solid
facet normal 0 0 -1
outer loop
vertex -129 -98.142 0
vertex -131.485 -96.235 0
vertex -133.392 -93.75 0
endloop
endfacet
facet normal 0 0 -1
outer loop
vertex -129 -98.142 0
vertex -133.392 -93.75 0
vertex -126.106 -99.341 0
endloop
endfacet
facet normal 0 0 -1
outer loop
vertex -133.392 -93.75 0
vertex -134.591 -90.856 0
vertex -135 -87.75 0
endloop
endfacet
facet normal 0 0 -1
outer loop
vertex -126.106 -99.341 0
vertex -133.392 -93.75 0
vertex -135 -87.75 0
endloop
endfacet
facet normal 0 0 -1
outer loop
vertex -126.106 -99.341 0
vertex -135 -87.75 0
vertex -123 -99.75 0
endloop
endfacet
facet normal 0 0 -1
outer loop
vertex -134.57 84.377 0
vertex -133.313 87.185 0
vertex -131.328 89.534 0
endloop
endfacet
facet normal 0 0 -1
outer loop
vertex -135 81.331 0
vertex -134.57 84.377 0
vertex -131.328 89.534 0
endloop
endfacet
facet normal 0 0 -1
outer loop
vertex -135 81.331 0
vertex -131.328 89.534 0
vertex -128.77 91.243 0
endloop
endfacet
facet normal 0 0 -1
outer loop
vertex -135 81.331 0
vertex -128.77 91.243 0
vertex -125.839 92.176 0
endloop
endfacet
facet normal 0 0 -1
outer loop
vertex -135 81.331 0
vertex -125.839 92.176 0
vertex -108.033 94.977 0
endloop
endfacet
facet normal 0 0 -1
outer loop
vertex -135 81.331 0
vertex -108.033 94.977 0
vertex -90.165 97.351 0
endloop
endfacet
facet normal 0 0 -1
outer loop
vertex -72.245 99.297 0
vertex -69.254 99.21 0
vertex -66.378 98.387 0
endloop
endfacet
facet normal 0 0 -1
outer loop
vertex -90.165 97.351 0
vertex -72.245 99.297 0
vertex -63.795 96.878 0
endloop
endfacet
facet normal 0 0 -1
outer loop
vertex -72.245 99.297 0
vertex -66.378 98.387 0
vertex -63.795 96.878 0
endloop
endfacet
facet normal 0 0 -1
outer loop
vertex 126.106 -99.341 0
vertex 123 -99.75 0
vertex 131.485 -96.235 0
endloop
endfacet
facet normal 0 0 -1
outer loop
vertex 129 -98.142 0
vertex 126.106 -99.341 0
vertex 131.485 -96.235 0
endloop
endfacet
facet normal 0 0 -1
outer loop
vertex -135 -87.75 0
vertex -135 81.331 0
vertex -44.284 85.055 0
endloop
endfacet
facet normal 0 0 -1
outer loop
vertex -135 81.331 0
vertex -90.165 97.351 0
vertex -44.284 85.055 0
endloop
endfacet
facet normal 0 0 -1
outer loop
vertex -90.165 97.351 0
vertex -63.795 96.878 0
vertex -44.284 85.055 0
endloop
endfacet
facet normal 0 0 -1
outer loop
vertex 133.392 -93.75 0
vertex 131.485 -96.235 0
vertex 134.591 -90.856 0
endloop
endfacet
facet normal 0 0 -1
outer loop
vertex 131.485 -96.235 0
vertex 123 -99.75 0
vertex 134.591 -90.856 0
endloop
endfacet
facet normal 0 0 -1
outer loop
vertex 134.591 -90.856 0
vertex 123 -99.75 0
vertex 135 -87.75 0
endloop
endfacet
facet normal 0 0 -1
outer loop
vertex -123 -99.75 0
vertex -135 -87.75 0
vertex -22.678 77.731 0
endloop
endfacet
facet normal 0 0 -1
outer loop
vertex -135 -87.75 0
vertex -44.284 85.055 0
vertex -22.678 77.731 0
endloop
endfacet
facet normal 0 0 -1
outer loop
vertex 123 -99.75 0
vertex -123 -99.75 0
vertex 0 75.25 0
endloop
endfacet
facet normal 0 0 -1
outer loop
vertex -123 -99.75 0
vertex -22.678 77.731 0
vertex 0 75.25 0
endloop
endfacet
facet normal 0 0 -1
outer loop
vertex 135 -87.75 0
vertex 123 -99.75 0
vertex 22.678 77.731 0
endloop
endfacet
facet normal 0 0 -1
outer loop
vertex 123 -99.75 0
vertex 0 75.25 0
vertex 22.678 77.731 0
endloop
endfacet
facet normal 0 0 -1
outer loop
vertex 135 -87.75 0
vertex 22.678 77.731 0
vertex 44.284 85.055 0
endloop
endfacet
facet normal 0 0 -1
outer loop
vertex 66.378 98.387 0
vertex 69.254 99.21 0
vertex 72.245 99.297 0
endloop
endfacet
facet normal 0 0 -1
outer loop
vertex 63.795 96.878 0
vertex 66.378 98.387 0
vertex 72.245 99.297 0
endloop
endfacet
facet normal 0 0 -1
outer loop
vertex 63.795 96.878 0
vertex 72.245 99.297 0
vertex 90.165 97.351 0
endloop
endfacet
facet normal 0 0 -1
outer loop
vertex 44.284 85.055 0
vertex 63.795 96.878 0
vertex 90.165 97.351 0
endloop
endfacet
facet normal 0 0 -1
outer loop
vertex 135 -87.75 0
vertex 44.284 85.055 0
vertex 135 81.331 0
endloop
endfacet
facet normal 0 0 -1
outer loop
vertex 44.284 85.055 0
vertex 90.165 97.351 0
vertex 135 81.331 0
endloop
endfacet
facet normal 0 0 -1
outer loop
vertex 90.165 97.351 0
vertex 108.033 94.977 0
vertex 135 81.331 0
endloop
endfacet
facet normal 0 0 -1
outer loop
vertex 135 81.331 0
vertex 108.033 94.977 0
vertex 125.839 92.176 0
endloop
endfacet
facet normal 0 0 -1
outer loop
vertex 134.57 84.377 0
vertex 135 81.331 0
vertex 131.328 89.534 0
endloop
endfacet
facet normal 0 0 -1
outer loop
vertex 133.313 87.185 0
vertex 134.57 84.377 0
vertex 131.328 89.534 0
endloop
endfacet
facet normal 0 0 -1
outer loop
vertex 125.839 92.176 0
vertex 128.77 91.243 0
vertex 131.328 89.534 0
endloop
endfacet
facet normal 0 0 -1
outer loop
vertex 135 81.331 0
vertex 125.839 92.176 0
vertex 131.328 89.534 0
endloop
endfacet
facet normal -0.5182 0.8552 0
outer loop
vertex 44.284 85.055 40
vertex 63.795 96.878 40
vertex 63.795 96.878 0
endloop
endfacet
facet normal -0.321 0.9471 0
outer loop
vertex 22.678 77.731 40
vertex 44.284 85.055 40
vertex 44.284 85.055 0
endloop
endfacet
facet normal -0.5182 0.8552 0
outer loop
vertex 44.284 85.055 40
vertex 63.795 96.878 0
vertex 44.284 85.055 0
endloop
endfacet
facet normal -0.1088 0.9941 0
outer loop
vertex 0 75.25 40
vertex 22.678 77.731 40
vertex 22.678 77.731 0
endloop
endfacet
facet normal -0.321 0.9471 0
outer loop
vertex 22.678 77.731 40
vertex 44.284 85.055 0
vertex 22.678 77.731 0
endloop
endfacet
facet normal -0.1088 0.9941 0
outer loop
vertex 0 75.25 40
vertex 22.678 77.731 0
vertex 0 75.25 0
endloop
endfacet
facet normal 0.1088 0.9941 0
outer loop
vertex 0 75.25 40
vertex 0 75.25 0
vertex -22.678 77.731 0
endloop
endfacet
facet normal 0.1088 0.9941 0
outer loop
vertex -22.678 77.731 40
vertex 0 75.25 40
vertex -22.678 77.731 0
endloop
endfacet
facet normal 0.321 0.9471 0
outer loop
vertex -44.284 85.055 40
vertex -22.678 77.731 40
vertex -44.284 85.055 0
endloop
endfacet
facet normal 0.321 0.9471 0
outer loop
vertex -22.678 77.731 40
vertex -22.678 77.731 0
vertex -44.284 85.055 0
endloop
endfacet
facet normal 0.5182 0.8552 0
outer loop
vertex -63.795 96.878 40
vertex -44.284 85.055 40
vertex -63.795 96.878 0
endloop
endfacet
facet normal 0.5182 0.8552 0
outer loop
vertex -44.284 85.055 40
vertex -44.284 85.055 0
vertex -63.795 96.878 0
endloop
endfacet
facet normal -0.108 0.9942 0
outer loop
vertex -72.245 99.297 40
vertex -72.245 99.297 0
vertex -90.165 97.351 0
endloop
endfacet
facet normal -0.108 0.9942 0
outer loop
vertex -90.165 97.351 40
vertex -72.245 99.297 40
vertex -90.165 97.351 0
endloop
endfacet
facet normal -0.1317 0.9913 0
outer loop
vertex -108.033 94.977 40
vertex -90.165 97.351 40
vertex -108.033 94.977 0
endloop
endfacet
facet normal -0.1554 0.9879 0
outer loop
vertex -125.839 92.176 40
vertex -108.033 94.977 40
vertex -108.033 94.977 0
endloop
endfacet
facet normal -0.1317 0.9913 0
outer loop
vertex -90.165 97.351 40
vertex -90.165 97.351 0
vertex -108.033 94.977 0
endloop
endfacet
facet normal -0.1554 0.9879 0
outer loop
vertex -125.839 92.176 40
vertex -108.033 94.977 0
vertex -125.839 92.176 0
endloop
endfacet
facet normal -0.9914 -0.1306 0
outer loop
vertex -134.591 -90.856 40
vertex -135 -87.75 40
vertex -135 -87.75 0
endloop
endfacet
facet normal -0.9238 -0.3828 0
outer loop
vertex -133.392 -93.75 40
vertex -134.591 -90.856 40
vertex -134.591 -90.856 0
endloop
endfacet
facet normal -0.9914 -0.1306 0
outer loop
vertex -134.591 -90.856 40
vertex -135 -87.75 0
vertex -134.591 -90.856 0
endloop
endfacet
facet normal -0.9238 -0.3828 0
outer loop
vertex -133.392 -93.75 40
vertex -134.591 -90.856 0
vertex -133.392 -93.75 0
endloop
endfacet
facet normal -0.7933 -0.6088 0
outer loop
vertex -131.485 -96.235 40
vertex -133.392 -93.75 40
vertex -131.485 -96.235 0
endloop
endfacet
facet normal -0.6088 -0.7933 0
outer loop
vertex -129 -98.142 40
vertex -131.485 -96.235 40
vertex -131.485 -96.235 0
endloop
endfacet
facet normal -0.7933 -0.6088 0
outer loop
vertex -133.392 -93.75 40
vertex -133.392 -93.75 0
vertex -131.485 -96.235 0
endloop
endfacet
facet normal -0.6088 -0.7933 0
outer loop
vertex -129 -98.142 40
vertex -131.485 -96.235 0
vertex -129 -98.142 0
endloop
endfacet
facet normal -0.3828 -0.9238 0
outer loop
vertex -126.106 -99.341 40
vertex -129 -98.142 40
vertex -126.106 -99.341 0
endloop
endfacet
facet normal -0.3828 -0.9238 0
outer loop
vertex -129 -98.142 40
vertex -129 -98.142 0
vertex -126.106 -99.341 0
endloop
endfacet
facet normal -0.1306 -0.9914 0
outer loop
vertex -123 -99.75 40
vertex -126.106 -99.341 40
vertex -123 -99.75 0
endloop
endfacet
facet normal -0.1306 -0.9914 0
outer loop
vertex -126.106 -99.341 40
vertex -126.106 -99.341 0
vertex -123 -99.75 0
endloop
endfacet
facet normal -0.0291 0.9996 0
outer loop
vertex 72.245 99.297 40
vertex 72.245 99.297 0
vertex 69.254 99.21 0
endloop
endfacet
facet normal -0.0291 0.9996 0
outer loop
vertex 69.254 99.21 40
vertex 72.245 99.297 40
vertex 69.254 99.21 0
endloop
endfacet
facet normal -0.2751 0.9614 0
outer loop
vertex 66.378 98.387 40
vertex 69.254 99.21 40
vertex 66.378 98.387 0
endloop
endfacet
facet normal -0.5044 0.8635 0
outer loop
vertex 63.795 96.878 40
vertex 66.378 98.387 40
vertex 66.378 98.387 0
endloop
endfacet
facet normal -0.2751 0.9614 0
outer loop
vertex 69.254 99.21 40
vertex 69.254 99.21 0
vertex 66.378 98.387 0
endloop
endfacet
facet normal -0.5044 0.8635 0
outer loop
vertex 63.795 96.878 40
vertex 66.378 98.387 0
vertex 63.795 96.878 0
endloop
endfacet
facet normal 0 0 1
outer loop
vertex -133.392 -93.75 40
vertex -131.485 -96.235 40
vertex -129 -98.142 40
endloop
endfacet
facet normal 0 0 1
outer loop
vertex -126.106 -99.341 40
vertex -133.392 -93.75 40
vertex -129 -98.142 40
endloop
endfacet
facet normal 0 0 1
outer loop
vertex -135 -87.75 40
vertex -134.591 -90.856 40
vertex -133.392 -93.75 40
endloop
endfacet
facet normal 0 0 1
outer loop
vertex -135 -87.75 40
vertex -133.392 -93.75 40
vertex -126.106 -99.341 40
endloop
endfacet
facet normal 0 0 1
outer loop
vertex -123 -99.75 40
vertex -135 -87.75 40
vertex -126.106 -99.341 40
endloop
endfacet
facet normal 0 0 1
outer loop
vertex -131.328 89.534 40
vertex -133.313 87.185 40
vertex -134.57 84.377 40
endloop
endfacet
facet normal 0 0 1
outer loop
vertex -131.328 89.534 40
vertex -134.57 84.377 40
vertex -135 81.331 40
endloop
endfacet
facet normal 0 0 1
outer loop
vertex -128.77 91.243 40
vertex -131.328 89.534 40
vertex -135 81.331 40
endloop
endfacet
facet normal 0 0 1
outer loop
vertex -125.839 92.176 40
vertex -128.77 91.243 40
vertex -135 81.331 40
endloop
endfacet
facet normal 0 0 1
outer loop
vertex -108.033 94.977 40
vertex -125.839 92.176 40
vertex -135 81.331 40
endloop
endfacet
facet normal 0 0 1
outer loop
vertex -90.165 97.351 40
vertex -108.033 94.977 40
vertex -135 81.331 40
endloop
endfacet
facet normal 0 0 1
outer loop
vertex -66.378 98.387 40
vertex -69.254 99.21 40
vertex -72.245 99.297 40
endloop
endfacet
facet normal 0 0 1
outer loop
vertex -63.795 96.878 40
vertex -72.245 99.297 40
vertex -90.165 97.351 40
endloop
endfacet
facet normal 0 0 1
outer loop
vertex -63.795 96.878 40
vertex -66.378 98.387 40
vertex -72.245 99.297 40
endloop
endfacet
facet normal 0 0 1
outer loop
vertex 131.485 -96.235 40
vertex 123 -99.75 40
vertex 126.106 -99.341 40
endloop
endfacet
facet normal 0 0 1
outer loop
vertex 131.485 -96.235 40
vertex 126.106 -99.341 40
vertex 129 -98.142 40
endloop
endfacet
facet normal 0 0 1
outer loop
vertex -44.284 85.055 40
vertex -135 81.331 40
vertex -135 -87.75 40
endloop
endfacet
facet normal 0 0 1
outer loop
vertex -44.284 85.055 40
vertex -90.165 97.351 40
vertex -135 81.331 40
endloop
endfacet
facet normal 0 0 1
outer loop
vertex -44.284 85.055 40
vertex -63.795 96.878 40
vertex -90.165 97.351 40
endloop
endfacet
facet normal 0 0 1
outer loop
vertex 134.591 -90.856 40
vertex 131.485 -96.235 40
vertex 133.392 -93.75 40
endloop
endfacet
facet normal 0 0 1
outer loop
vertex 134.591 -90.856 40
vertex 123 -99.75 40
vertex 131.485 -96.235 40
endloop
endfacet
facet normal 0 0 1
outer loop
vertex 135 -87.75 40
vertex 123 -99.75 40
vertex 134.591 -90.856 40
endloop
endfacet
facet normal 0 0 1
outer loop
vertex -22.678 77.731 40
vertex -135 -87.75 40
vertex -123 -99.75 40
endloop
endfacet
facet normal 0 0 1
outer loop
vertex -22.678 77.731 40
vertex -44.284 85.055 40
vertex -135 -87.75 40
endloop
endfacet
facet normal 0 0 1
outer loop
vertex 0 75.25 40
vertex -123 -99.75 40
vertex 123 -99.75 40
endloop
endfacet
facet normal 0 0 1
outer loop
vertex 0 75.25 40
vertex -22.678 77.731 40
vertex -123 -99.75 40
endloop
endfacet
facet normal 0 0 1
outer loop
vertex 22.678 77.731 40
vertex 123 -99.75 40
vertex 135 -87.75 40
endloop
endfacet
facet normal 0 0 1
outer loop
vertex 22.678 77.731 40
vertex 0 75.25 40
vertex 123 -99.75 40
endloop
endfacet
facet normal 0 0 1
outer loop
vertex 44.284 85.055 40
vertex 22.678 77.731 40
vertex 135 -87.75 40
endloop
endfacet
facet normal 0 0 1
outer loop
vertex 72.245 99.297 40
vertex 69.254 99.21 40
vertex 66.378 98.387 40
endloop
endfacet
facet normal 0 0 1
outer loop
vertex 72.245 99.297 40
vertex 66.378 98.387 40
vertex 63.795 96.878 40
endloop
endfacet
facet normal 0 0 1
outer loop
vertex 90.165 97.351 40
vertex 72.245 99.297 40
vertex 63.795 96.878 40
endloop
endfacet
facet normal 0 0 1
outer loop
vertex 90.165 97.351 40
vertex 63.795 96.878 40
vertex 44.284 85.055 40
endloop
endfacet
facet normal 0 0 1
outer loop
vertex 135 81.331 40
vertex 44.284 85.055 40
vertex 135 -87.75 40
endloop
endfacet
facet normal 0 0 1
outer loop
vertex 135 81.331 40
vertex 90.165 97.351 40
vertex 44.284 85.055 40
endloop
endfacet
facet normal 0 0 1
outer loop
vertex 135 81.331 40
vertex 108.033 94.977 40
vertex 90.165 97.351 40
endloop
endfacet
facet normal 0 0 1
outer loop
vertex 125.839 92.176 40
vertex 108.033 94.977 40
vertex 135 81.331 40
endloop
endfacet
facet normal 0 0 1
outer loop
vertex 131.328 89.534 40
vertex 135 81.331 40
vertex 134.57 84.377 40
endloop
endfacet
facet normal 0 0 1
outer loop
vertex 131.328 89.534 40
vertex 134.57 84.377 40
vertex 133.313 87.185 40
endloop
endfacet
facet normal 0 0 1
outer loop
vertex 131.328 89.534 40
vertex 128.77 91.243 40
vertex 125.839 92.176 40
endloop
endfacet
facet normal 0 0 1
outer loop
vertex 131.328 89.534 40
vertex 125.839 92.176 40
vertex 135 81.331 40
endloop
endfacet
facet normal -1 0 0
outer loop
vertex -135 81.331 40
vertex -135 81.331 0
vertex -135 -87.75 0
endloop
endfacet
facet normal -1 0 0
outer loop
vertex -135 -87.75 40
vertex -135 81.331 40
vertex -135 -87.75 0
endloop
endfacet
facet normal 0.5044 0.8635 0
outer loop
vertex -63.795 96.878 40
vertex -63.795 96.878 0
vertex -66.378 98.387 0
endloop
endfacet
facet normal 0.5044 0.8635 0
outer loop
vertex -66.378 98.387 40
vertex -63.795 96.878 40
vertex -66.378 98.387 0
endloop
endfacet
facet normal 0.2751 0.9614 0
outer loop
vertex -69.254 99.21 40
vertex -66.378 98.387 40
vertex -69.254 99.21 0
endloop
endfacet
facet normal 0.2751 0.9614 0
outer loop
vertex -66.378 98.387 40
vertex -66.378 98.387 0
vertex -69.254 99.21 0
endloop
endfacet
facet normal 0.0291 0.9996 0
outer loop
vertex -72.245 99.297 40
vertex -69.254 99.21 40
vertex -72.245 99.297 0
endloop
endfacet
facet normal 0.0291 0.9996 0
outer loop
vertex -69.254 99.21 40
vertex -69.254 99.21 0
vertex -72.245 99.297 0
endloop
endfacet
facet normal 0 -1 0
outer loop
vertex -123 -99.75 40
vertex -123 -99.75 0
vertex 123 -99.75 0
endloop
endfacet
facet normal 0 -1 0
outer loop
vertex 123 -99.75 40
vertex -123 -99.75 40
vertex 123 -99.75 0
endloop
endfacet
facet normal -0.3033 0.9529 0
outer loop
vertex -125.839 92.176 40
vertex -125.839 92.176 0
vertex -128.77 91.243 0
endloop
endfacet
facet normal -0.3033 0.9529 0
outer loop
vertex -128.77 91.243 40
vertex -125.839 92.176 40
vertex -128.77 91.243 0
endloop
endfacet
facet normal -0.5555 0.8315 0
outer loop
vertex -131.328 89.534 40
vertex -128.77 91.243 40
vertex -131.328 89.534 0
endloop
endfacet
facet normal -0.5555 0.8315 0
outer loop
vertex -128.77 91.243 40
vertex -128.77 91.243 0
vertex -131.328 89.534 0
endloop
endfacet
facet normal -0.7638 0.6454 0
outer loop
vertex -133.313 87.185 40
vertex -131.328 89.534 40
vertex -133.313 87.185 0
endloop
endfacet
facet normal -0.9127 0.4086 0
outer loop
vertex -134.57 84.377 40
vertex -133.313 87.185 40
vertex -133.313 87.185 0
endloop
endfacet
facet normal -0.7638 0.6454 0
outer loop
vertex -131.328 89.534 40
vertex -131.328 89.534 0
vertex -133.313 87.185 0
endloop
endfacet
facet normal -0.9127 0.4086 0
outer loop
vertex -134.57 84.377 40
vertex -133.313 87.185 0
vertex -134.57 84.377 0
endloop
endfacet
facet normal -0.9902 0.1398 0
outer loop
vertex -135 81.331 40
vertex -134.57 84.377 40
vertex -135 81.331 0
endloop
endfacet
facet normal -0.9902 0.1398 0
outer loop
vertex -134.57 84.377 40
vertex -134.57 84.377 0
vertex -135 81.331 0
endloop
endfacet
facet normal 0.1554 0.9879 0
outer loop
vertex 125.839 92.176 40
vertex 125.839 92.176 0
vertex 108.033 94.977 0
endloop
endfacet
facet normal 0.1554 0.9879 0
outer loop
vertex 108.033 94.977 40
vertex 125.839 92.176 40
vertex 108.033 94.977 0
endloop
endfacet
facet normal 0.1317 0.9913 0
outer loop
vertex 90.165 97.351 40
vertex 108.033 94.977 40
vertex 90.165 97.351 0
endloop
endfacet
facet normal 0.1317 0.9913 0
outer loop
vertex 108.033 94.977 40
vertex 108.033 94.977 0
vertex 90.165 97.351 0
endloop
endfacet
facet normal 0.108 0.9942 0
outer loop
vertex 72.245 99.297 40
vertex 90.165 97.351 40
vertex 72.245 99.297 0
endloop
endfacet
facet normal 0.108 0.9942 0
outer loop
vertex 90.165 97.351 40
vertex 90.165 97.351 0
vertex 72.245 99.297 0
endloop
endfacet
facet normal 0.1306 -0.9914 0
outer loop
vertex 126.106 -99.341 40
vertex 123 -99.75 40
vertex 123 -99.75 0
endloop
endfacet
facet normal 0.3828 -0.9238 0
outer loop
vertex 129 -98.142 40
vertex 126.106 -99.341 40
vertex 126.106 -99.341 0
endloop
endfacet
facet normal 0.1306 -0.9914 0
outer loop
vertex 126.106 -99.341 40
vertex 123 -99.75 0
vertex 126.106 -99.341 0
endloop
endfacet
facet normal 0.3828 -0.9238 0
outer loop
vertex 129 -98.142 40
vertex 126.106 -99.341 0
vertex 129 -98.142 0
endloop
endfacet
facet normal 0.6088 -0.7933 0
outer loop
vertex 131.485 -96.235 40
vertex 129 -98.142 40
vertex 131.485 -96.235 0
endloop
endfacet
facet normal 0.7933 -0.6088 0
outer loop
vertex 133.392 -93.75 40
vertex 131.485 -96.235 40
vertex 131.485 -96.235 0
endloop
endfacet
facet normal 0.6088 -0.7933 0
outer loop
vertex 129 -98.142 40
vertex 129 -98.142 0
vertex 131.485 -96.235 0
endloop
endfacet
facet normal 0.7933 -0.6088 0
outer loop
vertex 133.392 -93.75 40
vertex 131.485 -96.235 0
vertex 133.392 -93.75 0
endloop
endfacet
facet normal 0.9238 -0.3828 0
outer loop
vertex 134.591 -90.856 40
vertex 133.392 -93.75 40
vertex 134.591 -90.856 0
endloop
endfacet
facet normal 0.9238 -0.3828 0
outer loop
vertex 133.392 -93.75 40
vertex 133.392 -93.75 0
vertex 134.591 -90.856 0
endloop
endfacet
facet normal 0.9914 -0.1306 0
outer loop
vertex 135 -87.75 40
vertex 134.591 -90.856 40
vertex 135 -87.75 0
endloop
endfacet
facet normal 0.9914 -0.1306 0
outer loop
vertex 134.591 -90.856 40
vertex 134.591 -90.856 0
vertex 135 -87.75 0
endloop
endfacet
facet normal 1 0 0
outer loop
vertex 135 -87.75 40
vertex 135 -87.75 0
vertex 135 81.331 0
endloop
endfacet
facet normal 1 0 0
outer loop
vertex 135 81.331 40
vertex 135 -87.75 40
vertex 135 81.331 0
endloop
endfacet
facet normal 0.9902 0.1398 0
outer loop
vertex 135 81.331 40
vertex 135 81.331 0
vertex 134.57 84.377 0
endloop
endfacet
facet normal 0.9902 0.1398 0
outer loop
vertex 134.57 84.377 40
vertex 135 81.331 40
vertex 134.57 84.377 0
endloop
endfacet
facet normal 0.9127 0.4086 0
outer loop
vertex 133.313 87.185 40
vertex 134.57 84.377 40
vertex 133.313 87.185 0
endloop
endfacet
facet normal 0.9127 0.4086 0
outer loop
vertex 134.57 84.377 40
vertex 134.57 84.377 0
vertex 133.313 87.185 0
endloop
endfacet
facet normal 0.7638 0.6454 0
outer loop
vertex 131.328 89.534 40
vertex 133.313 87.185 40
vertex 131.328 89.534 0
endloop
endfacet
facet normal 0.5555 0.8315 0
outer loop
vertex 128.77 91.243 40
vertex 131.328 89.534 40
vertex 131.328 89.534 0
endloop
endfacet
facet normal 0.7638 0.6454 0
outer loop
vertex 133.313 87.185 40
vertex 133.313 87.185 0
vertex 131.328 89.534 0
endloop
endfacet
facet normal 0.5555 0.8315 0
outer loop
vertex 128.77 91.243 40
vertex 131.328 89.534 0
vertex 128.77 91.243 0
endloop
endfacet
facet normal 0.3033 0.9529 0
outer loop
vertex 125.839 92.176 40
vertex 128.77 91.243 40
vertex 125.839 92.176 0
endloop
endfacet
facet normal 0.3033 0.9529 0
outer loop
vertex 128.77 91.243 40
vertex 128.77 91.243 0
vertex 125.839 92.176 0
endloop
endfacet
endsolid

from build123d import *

# Parameters (mm, degrees)
F1_DEPTH = 40


with BuildPart() as f1:
    # F0 (on Top) → F1 (new body)
    with BuildSketch(Plane.XY):
        with BuildLine():
            ThreePointArc((-135, -87.75), (-131.485281, -96.235281), (-123, -99.75))
            Line((-123, -99.75), (123, -99.75))
            ThreePointArc((123, -99.75), (131.485281, -96.235281), (135, -87.75))
            Line((135, -87.75), (135, 81.331121))
            ThreePointArc((135, 81.331121), (132.403394, 88.429218), (125.839459, 92.17623))
            ThreePointArc((125.839459, 92.17623), (99.105981, 96.217898), (72.244569, 99.296609))
            ThreePointArc((72.244569, 99.296609), (67.790252, 98.888715), (63.794752, 96.877918))
            ThreePointArc((63.794752, 96.877918), (33.680622, 80.80401), (0, 75.25))
            ThreePointArc((0, 75.25), (-33.680622, 80.80401), (-63.794752, 96.877918))
            ThreePointArc((-63.794752, 96.877918), (-67.790252, 98.888715), (-72.244569, 99.296609))
            ThreePointArc((-72.244569, 99.296609), (-99.105981, 96.217898), (-125.839459, 92.17623))
            ThreePointArc((-125.839459, 92.17623), (-132.403394, 88.429218), (-135, 81.331121))
            Line((-135, 81.331121), (-135, -87.75))
        make_face()
    extrude(amount=F1_DEPTH)


solid = f1.part
